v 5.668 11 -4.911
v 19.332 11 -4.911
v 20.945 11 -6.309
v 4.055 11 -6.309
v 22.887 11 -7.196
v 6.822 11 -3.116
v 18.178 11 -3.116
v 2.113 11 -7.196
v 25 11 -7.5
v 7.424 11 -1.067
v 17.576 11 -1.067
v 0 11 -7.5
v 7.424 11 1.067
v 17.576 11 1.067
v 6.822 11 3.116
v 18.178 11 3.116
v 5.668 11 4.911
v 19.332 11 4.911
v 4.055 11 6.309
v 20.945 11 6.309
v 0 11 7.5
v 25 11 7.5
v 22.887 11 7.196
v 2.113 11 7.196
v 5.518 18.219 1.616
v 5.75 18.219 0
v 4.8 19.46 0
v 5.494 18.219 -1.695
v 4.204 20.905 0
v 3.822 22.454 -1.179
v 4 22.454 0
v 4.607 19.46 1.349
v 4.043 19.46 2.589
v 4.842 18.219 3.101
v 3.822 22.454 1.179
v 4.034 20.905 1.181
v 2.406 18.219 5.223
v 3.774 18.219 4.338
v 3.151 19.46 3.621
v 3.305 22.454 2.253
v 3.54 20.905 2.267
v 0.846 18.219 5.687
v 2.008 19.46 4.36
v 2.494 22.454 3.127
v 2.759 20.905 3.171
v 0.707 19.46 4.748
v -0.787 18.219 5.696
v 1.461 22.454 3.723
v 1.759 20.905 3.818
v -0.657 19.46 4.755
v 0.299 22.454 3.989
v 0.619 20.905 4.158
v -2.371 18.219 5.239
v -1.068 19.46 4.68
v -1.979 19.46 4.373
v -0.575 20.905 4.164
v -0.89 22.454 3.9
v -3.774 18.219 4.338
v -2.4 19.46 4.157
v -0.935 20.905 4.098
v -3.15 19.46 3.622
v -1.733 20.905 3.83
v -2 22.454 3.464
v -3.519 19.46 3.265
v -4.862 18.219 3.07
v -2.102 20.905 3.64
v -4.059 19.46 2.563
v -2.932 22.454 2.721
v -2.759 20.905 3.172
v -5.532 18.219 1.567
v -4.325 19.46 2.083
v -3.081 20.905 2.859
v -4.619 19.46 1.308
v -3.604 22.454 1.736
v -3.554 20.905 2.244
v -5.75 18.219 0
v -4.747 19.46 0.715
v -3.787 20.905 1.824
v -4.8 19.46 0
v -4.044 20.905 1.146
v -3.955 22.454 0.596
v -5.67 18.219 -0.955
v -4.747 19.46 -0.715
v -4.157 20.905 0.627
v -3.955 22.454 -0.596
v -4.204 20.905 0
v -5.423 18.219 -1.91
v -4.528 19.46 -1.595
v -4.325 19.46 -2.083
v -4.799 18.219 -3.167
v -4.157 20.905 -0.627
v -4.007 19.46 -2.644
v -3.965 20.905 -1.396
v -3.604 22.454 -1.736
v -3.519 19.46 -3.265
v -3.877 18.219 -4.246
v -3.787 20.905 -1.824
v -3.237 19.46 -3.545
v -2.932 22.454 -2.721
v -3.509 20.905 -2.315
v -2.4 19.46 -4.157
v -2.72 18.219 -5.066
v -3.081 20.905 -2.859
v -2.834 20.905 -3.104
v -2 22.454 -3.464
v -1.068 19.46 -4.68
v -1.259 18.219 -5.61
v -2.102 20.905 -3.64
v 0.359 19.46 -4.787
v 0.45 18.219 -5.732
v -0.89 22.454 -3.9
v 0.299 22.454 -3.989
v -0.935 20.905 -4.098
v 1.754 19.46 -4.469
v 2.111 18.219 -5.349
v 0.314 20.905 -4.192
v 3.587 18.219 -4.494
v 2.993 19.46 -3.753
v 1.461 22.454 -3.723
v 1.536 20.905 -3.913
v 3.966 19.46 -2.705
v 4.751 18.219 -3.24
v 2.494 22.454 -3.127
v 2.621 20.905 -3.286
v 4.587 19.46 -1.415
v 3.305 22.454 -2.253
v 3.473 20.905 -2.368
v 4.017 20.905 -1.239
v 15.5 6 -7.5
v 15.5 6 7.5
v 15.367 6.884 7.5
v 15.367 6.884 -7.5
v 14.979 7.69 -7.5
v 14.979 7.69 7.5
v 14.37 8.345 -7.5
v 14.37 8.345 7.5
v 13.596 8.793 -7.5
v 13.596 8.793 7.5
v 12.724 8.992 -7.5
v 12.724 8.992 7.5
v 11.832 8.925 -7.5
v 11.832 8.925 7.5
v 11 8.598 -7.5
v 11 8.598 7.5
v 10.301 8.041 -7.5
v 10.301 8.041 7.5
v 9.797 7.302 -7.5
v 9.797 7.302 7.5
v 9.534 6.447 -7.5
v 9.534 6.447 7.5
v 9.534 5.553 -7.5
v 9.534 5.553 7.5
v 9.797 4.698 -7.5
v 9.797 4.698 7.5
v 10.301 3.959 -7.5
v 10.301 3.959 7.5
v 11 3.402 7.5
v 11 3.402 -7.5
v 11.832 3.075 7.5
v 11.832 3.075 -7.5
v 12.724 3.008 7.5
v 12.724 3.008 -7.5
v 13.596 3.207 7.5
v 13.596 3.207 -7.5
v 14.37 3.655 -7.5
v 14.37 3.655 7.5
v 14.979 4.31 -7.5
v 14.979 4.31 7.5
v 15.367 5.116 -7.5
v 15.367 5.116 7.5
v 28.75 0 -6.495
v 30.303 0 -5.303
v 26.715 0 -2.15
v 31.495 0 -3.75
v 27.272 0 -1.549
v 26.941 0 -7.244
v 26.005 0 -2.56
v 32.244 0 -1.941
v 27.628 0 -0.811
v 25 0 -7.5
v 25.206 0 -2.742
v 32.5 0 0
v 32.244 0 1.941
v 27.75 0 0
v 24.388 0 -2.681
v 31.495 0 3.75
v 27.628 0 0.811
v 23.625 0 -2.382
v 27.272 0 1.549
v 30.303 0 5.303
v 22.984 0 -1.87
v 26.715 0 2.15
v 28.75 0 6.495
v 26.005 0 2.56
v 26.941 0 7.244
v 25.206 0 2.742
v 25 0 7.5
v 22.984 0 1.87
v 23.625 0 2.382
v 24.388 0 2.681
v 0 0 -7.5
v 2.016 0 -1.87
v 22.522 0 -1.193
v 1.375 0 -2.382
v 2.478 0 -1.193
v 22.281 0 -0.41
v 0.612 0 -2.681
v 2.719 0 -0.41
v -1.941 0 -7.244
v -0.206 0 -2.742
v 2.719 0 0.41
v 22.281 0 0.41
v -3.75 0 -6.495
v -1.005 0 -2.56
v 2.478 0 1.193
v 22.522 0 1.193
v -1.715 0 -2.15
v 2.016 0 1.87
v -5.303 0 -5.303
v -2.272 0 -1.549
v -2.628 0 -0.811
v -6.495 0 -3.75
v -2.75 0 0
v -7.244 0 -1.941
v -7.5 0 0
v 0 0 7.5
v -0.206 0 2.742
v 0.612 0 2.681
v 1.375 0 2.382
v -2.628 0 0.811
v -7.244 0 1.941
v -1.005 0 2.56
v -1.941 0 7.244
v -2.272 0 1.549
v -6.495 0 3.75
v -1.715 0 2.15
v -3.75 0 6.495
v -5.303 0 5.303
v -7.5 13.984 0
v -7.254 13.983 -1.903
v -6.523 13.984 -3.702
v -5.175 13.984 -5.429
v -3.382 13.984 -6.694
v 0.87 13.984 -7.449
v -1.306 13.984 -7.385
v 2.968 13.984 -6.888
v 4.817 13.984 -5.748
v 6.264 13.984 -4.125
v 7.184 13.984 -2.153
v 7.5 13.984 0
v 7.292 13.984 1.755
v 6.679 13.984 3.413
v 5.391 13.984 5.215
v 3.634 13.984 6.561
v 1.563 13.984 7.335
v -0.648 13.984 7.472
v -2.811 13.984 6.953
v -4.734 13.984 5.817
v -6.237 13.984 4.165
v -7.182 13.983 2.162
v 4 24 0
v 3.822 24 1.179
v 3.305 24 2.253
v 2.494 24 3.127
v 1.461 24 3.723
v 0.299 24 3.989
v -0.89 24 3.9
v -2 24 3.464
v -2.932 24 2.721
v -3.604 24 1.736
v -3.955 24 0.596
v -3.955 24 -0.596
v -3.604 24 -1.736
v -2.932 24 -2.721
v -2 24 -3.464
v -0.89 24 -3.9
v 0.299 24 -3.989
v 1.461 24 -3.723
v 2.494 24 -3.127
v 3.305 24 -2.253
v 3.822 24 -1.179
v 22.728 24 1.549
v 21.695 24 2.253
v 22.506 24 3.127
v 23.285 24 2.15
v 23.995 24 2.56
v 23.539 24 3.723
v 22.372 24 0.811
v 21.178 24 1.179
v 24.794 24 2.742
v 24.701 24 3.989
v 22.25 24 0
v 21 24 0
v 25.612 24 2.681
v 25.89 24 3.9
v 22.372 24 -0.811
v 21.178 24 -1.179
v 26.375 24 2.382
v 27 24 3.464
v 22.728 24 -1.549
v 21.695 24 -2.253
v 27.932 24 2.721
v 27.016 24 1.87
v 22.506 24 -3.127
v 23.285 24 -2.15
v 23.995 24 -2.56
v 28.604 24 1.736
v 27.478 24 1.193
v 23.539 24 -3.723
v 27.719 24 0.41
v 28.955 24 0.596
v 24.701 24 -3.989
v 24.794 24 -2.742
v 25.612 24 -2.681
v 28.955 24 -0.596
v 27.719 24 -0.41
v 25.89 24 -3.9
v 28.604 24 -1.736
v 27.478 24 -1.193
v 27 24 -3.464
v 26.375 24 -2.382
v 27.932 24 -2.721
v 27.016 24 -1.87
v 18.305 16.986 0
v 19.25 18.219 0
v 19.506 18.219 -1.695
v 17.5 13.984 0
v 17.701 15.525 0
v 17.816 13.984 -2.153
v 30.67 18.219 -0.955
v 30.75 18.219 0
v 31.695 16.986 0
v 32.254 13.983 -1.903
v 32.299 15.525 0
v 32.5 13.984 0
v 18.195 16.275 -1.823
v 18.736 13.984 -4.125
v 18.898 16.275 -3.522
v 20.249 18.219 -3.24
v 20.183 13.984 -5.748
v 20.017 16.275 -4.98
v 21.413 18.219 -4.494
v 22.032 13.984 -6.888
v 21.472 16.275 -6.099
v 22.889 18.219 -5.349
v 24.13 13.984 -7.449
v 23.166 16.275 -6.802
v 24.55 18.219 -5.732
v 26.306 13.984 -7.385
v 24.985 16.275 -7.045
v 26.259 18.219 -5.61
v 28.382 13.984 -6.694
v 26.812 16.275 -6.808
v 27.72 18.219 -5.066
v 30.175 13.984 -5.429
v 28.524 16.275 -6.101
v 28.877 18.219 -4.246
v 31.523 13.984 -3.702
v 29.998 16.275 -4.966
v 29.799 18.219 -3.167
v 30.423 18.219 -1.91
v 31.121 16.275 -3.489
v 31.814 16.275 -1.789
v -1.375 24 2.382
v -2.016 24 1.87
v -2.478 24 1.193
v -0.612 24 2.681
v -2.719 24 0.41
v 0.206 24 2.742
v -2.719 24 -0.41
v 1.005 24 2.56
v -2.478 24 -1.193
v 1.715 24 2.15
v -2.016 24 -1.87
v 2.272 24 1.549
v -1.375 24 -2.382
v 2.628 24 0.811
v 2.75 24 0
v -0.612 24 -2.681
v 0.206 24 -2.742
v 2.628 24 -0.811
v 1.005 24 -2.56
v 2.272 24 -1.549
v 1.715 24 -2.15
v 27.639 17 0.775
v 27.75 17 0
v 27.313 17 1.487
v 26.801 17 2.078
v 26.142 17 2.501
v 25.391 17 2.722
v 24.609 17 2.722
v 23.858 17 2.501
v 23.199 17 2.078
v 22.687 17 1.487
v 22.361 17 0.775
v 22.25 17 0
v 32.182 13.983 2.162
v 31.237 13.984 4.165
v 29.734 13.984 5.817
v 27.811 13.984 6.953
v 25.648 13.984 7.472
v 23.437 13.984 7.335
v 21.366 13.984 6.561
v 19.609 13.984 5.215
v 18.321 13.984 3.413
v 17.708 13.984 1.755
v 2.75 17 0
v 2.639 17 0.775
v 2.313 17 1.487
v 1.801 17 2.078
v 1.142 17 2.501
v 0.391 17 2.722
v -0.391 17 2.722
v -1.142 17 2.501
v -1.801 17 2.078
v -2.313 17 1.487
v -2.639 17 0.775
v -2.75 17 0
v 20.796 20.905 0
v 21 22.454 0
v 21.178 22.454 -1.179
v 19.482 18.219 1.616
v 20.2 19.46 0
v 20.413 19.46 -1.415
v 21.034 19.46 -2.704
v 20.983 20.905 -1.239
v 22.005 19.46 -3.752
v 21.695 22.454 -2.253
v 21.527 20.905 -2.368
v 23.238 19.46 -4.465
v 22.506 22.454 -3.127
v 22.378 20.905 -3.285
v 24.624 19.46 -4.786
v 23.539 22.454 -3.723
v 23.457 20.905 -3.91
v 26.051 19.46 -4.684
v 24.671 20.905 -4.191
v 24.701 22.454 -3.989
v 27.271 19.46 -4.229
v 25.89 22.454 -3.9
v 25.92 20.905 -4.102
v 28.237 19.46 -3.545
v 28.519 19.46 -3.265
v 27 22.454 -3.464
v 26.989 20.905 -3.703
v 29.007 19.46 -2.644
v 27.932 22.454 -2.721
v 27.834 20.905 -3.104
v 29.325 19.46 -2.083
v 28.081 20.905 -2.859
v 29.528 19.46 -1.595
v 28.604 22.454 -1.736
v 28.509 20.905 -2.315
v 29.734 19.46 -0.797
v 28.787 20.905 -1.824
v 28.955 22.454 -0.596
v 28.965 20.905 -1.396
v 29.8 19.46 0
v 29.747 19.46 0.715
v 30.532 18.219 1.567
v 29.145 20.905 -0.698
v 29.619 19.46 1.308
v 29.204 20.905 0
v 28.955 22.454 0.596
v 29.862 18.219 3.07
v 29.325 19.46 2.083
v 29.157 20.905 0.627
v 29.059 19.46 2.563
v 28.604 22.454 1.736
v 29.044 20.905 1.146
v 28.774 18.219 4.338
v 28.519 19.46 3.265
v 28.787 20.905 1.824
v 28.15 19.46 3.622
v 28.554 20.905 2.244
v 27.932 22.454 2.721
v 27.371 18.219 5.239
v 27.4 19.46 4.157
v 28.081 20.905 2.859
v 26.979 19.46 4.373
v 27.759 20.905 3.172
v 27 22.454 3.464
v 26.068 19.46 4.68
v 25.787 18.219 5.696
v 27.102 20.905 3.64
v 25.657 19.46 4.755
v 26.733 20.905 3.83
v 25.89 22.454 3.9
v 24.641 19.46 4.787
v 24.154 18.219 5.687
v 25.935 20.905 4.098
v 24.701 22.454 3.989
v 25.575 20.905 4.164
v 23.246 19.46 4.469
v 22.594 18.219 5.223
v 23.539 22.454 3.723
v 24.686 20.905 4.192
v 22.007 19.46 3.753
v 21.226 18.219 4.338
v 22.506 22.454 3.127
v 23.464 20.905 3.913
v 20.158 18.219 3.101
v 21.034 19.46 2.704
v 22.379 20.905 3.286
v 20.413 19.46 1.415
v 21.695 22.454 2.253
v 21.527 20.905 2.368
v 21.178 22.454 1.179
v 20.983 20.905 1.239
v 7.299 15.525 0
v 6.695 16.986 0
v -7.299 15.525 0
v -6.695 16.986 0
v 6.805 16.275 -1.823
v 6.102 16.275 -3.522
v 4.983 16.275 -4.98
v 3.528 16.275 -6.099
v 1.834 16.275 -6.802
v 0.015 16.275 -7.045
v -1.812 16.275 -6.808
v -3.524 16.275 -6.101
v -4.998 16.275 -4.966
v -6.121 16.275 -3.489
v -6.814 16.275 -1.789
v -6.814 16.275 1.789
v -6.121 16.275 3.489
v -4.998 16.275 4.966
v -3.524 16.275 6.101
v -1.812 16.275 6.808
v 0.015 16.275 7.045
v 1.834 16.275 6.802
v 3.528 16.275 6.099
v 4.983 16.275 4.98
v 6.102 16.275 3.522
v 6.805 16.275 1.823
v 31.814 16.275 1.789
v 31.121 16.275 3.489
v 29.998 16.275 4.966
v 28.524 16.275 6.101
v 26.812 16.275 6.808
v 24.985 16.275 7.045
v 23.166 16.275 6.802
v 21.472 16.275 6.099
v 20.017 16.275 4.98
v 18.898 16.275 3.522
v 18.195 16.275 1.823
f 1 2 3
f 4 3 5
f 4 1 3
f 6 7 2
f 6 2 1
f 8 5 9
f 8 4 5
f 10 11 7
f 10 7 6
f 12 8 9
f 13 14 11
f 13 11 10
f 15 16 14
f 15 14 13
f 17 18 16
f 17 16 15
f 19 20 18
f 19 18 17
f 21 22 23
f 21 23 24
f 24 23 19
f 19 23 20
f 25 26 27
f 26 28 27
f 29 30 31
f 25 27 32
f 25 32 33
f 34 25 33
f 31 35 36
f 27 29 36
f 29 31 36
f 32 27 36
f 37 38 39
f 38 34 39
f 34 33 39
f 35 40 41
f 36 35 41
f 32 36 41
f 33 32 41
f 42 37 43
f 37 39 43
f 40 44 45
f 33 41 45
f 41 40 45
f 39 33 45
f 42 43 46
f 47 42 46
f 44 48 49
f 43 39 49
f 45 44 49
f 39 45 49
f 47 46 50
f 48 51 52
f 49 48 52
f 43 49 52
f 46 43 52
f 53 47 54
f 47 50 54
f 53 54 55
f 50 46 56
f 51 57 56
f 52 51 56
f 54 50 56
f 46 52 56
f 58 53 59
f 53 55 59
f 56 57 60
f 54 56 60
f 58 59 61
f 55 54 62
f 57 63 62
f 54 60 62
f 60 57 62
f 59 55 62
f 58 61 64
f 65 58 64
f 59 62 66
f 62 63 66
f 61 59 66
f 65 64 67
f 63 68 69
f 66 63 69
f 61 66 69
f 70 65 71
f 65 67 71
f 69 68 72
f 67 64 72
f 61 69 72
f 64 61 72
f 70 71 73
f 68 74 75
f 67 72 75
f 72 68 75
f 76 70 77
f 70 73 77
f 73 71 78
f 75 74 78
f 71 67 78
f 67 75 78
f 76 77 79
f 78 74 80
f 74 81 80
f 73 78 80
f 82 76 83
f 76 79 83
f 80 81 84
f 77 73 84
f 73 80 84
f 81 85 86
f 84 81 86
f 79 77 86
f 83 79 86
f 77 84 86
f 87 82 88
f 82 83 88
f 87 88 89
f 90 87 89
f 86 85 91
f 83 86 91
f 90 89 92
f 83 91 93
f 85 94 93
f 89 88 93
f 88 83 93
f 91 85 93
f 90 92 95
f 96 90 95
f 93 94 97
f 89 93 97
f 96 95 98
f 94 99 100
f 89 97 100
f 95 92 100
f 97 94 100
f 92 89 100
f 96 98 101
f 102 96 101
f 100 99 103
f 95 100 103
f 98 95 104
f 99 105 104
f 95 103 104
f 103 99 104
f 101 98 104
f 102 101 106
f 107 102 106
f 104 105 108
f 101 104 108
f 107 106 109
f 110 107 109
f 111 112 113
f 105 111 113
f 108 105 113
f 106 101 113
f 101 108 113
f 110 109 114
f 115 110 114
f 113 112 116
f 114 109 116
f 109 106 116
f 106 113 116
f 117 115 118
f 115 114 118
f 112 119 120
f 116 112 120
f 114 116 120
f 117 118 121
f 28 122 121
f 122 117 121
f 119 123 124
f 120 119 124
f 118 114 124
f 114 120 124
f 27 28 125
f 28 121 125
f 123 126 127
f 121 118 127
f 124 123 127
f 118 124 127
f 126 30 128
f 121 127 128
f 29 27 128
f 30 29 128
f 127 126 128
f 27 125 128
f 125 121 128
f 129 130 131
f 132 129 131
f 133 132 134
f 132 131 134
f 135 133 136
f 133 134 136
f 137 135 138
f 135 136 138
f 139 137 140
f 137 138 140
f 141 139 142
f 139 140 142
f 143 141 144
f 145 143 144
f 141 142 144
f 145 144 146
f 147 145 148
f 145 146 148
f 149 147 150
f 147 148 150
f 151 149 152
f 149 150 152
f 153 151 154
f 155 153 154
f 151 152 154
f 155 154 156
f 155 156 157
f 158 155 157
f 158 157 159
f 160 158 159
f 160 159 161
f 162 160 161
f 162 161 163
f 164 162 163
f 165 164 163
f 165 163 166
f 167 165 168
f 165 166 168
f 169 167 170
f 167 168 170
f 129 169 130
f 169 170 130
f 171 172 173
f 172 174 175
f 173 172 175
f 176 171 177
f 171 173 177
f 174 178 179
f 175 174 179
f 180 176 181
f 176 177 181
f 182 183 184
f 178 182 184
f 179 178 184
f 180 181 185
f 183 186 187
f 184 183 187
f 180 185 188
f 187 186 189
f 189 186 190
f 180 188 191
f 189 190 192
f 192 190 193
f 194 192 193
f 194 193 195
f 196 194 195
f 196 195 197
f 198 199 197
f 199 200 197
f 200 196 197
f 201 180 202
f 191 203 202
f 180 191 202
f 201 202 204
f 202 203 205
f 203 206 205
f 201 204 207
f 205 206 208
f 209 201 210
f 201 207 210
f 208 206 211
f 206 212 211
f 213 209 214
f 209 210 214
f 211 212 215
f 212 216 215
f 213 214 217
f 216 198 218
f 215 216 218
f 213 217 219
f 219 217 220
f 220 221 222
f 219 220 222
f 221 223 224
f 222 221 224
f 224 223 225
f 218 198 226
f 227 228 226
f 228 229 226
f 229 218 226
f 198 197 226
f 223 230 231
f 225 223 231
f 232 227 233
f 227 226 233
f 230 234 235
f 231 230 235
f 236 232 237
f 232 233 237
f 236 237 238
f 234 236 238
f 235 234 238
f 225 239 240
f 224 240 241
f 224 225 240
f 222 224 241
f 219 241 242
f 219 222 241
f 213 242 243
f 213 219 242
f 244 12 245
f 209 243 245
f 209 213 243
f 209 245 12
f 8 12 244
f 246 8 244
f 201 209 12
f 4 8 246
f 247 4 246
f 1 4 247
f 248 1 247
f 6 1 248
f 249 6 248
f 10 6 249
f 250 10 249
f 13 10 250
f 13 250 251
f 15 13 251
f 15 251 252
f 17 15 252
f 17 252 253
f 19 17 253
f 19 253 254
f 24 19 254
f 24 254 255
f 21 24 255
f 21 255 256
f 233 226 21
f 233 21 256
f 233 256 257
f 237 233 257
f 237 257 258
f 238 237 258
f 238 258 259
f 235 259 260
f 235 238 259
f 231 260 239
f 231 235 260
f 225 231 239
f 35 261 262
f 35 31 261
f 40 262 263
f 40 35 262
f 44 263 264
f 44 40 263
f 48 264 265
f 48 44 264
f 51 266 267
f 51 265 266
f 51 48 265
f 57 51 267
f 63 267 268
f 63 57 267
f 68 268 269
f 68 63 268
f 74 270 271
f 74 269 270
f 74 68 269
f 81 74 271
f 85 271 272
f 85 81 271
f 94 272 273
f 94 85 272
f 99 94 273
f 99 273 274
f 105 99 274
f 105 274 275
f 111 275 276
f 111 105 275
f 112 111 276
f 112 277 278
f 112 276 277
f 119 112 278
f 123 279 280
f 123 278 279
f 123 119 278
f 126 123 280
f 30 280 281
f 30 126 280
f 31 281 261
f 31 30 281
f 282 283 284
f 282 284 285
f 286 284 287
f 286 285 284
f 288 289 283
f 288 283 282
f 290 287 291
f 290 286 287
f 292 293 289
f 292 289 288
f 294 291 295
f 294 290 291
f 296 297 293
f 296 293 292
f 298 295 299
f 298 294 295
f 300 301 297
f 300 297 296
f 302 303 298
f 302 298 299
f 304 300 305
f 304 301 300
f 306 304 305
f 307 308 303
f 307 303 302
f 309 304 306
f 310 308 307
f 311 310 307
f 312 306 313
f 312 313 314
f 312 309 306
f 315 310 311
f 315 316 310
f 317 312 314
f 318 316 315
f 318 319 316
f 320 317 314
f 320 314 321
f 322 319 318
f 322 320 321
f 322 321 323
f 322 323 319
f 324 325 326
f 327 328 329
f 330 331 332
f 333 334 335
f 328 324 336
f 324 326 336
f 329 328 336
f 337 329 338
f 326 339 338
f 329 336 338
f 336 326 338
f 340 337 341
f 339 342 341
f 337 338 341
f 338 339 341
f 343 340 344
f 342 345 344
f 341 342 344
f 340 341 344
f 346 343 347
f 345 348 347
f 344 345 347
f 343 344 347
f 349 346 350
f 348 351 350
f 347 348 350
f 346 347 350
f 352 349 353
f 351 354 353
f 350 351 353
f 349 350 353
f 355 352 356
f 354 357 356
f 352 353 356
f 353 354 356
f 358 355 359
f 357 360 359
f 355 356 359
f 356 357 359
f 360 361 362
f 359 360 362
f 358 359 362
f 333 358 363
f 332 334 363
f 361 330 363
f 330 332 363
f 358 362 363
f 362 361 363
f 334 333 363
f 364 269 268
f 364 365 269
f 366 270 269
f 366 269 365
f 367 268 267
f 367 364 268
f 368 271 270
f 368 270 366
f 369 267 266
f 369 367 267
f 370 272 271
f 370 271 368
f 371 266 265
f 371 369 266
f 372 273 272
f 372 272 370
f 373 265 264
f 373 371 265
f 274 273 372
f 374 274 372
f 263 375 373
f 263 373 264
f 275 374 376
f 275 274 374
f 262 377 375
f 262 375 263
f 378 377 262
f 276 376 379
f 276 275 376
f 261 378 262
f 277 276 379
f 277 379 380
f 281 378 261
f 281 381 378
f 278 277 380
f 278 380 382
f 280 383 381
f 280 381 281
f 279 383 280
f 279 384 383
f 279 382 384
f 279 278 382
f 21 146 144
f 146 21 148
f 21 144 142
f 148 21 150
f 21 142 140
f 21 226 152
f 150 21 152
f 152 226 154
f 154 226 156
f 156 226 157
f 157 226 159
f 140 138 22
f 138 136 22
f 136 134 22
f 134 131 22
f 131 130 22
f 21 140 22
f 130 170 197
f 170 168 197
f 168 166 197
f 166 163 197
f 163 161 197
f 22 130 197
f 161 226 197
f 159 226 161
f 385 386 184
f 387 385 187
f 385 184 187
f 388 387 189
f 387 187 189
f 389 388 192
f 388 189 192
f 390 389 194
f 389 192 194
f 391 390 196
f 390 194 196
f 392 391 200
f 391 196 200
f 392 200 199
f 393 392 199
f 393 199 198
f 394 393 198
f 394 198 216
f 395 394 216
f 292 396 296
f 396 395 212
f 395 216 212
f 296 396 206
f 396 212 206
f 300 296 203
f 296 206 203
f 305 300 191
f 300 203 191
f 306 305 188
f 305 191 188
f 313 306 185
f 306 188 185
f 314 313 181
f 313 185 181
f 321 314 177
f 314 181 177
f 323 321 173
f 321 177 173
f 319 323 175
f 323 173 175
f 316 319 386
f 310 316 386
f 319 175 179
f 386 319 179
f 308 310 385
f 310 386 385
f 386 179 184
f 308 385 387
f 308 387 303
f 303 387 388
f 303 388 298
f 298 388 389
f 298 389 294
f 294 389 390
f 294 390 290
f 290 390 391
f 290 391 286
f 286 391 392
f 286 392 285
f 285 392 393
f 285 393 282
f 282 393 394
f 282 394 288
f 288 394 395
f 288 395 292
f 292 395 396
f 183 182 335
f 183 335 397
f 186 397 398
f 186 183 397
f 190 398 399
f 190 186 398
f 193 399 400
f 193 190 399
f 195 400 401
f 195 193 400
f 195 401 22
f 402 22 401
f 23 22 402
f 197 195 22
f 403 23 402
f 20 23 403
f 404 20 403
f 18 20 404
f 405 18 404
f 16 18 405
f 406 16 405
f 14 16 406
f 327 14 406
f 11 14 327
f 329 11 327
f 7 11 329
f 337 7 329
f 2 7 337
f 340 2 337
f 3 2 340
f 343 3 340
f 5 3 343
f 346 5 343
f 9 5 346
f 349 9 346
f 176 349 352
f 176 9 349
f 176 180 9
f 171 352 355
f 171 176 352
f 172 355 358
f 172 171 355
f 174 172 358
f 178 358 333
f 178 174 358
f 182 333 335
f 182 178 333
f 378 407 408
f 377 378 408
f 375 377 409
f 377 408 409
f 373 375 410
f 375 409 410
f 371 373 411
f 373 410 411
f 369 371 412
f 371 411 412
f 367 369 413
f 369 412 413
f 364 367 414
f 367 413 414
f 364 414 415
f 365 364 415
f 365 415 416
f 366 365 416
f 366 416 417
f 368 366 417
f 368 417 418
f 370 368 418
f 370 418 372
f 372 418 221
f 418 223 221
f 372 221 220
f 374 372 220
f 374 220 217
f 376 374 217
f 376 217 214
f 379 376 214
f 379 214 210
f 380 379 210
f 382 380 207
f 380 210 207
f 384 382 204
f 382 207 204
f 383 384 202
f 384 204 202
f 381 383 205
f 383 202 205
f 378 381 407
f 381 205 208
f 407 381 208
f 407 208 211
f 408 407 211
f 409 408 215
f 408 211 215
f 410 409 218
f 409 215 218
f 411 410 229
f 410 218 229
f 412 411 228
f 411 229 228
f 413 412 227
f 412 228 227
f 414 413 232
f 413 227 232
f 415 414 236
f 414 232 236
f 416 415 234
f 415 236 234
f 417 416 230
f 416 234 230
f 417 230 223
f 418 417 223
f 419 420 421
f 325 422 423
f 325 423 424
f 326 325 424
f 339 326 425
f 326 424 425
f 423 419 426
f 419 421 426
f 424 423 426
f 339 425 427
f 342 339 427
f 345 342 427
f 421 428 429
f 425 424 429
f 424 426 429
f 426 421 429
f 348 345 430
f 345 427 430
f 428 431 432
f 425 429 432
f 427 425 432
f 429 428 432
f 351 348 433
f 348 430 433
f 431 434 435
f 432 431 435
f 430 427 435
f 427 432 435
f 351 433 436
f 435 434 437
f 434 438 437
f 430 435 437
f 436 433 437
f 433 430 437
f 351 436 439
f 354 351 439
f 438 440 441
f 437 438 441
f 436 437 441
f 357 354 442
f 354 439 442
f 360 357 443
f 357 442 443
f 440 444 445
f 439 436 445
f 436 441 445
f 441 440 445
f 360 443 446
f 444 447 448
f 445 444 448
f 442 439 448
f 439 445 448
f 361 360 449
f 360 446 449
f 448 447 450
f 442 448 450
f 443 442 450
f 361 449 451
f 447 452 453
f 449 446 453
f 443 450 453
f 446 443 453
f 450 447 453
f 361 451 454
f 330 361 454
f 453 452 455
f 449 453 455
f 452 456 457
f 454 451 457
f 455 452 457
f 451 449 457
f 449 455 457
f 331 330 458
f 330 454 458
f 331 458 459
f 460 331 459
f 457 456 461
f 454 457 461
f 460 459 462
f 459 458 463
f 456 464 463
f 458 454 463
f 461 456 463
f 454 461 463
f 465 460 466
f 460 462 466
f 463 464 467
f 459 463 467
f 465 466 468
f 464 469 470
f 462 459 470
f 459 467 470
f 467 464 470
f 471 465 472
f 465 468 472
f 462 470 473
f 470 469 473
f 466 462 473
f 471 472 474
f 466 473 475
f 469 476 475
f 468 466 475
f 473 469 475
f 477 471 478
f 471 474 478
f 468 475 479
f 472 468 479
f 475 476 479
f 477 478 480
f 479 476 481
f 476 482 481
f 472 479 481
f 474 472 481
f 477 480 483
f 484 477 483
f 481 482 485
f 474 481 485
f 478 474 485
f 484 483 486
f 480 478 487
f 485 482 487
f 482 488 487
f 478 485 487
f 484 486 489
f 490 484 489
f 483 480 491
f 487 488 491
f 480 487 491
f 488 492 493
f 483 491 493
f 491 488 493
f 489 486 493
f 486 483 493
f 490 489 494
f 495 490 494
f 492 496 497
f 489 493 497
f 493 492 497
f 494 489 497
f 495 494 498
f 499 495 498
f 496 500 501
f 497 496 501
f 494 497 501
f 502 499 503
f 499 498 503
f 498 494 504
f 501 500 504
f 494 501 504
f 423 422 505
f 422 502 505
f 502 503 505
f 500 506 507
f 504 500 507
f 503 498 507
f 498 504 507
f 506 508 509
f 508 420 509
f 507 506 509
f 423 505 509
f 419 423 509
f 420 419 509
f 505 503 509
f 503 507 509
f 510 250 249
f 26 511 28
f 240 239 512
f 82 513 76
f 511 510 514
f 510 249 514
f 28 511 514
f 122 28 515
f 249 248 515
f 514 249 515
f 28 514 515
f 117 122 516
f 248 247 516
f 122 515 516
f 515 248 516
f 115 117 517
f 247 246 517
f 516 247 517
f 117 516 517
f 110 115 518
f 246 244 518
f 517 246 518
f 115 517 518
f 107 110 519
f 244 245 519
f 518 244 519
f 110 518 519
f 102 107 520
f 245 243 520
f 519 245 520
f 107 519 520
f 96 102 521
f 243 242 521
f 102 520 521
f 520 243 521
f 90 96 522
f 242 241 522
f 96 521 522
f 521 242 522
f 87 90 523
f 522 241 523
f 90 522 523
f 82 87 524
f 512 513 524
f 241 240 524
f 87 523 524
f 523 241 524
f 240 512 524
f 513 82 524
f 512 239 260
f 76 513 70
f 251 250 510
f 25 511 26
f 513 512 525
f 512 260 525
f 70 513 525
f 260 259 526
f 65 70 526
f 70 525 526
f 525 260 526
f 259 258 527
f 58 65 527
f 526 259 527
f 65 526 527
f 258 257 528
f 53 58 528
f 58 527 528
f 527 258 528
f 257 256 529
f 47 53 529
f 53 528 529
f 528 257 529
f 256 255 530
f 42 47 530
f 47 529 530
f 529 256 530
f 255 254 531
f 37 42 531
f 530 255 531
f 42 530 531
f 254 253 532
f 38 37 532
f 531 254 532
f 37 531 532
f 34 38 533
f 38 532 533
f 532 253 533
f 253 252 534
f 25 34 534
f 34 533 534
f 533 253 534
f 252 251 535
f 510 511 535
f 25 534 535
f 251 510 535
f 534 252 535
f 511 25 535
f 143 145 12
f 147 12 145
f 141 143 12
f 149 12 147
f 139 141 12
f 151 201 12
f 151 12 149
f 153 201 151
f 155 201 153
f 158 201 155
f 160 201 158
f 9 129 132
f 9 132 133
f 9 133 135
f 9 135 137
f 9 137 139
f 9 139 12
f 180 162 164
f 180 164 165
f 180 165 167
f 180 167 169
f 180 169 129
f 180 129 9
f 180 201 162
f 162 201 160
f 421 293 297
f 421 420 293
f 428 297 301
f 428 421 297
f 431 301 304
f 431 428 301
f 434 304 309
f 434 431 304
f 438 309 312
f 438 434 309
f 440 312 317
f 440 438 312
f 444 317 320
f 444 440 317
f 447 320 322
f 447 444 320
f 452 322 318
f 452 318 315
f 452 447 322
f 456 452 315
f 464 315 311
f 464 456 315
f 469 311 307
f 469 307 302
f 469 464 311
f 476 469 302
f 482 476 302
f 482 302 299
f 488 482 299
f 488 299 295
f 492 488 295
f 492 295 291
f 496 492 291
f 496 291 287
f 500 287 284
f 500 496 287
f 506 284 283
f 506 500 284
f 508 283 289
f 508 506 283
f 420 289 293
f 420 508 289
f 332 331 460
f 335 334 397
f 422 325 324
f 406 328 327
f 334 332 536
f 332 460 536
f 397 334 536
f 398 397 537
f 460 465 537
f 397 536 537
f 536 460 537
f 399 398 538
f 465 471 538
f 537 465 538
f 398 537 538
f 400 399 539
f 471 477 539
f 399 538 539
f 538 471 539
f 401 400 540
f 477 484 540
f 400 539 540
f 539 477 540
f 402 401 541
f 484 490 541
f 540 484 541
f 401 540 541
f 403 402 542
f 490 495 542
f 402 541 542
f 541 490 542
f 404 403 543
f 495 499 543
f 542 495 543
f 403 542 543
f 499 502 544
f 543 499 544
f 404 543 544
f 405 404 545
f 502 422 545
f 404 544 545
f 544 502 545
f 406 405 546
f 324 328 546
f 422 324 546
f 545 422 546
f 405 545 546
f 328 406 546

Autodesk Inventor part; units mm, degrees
ref_plane "XZ Plane" through (0, 0, 0) normal (0, 1, 0) x (-1, 0, 0)
ref_plane "XY Plane" through (0, 0, 0) normal (0, 0, 1) x (1, 0, 0)
sketch "Sketch1" plane through (0, 0, 0) normal (0, 1, 0) x (-1, 0, 0)
  circle A0 centre (0, 0) radius 7.5
  circle A1 centre (0, 0) radius 2.75
  dimension "d0" = 15
  dimension "d1" = 5.5
extrude "Extrusion1" add sketch "Sketch1" along normal blind 17
sketch "Sketch2" plane through (0, 17, 0) normal (0, 1, 0) x (1, 0, 0)
  circle A0 centre (0, 0) radius 2.75 projected
  circle A1 centre (0, 0) radius 2.75
  circle A2 centre (0, 0) radius 4
  dimension "d4" = 5.5
  dimension "d5" = 8
extrude "Extrusion2" add sketch "Sketch2" along normal blind 7
fillet "Fillet1" radius 6 1 edges at (-4, 17, 0)
fillet "Fillet2" radius 6 2 edges at (0, 17, -7.5) (0, 17, 7.5)
ref_plane "Work Plane1" through (12.5, 0, 0) normal (1, 0, 0) x (0, 1, 0)
mirror "Mirror1" about plane through (12.5, 0, 0) normal (1, 0, 0) of "Extrusion1", "Extrusion2", "Fillet1", "Fillet2"
sketch "Sketch3" plane through (0, 0, 0) normal (0, 1, 0) x (-1, 0, 0)
  circle A0 centre (-25, 0) radius 2.75 projected
  line L0 (-25, 0) -> (-25, 2.75)
  line L1 (-25, 0) -> (-25, -2.75)
  line L2 (0, 0) -> (0, -2.75)
  circle A1 centre (0, 0) radius 2.75 projected
  line L3 (0, 0) -> (0, 2.75)
  line L4 (-25, 2.75) -> (0, 2.75)
  line L5 (0, 2.75) -> (0, 7.5)
  line L6 (0, 7.5) -> (-25, 7.5)
  line L7 (-25, 7.5) -> (-25, 2.75)
  line L8 (-25, -2.75) -> (0, -2.75)
  line L9 (0, -2.75) -> (0, -7.5)
  line L10 (0, -7.5) -> (-25, -7.5)
  line L11 (-25, -7.5) -> (-25, -2.75)
  dimension "d11" = 25
  dimension "d12" = 4.75
  dimension "d13" = 25
  dimension "d14" = 4.75
extrude "Extrusion3" add sketch "Sketch3" along normal blind 11 contours A0 L4 A1 L8 | L7 L6 L5 L4 | L8 L9 L10 L11
sketch "Sketch4" plane through (0, 0, 7.5) normal (0, 0, 1) x (1, 0, 0)
  line L0 (25, 11) -> (0, 11) projected
  line L1 (12.5, 11) -> (12.5, 6)
  circle A0 centre (12.5, 6) radius 3
  point P0 (0, 0)
  dimension "d17" = 5
  dimension "d18" = 6
extrude "Extrusion4" cut sketch "Sketch4" against normal through all
properties part number "4mm_Roller_Spacer_extended"
